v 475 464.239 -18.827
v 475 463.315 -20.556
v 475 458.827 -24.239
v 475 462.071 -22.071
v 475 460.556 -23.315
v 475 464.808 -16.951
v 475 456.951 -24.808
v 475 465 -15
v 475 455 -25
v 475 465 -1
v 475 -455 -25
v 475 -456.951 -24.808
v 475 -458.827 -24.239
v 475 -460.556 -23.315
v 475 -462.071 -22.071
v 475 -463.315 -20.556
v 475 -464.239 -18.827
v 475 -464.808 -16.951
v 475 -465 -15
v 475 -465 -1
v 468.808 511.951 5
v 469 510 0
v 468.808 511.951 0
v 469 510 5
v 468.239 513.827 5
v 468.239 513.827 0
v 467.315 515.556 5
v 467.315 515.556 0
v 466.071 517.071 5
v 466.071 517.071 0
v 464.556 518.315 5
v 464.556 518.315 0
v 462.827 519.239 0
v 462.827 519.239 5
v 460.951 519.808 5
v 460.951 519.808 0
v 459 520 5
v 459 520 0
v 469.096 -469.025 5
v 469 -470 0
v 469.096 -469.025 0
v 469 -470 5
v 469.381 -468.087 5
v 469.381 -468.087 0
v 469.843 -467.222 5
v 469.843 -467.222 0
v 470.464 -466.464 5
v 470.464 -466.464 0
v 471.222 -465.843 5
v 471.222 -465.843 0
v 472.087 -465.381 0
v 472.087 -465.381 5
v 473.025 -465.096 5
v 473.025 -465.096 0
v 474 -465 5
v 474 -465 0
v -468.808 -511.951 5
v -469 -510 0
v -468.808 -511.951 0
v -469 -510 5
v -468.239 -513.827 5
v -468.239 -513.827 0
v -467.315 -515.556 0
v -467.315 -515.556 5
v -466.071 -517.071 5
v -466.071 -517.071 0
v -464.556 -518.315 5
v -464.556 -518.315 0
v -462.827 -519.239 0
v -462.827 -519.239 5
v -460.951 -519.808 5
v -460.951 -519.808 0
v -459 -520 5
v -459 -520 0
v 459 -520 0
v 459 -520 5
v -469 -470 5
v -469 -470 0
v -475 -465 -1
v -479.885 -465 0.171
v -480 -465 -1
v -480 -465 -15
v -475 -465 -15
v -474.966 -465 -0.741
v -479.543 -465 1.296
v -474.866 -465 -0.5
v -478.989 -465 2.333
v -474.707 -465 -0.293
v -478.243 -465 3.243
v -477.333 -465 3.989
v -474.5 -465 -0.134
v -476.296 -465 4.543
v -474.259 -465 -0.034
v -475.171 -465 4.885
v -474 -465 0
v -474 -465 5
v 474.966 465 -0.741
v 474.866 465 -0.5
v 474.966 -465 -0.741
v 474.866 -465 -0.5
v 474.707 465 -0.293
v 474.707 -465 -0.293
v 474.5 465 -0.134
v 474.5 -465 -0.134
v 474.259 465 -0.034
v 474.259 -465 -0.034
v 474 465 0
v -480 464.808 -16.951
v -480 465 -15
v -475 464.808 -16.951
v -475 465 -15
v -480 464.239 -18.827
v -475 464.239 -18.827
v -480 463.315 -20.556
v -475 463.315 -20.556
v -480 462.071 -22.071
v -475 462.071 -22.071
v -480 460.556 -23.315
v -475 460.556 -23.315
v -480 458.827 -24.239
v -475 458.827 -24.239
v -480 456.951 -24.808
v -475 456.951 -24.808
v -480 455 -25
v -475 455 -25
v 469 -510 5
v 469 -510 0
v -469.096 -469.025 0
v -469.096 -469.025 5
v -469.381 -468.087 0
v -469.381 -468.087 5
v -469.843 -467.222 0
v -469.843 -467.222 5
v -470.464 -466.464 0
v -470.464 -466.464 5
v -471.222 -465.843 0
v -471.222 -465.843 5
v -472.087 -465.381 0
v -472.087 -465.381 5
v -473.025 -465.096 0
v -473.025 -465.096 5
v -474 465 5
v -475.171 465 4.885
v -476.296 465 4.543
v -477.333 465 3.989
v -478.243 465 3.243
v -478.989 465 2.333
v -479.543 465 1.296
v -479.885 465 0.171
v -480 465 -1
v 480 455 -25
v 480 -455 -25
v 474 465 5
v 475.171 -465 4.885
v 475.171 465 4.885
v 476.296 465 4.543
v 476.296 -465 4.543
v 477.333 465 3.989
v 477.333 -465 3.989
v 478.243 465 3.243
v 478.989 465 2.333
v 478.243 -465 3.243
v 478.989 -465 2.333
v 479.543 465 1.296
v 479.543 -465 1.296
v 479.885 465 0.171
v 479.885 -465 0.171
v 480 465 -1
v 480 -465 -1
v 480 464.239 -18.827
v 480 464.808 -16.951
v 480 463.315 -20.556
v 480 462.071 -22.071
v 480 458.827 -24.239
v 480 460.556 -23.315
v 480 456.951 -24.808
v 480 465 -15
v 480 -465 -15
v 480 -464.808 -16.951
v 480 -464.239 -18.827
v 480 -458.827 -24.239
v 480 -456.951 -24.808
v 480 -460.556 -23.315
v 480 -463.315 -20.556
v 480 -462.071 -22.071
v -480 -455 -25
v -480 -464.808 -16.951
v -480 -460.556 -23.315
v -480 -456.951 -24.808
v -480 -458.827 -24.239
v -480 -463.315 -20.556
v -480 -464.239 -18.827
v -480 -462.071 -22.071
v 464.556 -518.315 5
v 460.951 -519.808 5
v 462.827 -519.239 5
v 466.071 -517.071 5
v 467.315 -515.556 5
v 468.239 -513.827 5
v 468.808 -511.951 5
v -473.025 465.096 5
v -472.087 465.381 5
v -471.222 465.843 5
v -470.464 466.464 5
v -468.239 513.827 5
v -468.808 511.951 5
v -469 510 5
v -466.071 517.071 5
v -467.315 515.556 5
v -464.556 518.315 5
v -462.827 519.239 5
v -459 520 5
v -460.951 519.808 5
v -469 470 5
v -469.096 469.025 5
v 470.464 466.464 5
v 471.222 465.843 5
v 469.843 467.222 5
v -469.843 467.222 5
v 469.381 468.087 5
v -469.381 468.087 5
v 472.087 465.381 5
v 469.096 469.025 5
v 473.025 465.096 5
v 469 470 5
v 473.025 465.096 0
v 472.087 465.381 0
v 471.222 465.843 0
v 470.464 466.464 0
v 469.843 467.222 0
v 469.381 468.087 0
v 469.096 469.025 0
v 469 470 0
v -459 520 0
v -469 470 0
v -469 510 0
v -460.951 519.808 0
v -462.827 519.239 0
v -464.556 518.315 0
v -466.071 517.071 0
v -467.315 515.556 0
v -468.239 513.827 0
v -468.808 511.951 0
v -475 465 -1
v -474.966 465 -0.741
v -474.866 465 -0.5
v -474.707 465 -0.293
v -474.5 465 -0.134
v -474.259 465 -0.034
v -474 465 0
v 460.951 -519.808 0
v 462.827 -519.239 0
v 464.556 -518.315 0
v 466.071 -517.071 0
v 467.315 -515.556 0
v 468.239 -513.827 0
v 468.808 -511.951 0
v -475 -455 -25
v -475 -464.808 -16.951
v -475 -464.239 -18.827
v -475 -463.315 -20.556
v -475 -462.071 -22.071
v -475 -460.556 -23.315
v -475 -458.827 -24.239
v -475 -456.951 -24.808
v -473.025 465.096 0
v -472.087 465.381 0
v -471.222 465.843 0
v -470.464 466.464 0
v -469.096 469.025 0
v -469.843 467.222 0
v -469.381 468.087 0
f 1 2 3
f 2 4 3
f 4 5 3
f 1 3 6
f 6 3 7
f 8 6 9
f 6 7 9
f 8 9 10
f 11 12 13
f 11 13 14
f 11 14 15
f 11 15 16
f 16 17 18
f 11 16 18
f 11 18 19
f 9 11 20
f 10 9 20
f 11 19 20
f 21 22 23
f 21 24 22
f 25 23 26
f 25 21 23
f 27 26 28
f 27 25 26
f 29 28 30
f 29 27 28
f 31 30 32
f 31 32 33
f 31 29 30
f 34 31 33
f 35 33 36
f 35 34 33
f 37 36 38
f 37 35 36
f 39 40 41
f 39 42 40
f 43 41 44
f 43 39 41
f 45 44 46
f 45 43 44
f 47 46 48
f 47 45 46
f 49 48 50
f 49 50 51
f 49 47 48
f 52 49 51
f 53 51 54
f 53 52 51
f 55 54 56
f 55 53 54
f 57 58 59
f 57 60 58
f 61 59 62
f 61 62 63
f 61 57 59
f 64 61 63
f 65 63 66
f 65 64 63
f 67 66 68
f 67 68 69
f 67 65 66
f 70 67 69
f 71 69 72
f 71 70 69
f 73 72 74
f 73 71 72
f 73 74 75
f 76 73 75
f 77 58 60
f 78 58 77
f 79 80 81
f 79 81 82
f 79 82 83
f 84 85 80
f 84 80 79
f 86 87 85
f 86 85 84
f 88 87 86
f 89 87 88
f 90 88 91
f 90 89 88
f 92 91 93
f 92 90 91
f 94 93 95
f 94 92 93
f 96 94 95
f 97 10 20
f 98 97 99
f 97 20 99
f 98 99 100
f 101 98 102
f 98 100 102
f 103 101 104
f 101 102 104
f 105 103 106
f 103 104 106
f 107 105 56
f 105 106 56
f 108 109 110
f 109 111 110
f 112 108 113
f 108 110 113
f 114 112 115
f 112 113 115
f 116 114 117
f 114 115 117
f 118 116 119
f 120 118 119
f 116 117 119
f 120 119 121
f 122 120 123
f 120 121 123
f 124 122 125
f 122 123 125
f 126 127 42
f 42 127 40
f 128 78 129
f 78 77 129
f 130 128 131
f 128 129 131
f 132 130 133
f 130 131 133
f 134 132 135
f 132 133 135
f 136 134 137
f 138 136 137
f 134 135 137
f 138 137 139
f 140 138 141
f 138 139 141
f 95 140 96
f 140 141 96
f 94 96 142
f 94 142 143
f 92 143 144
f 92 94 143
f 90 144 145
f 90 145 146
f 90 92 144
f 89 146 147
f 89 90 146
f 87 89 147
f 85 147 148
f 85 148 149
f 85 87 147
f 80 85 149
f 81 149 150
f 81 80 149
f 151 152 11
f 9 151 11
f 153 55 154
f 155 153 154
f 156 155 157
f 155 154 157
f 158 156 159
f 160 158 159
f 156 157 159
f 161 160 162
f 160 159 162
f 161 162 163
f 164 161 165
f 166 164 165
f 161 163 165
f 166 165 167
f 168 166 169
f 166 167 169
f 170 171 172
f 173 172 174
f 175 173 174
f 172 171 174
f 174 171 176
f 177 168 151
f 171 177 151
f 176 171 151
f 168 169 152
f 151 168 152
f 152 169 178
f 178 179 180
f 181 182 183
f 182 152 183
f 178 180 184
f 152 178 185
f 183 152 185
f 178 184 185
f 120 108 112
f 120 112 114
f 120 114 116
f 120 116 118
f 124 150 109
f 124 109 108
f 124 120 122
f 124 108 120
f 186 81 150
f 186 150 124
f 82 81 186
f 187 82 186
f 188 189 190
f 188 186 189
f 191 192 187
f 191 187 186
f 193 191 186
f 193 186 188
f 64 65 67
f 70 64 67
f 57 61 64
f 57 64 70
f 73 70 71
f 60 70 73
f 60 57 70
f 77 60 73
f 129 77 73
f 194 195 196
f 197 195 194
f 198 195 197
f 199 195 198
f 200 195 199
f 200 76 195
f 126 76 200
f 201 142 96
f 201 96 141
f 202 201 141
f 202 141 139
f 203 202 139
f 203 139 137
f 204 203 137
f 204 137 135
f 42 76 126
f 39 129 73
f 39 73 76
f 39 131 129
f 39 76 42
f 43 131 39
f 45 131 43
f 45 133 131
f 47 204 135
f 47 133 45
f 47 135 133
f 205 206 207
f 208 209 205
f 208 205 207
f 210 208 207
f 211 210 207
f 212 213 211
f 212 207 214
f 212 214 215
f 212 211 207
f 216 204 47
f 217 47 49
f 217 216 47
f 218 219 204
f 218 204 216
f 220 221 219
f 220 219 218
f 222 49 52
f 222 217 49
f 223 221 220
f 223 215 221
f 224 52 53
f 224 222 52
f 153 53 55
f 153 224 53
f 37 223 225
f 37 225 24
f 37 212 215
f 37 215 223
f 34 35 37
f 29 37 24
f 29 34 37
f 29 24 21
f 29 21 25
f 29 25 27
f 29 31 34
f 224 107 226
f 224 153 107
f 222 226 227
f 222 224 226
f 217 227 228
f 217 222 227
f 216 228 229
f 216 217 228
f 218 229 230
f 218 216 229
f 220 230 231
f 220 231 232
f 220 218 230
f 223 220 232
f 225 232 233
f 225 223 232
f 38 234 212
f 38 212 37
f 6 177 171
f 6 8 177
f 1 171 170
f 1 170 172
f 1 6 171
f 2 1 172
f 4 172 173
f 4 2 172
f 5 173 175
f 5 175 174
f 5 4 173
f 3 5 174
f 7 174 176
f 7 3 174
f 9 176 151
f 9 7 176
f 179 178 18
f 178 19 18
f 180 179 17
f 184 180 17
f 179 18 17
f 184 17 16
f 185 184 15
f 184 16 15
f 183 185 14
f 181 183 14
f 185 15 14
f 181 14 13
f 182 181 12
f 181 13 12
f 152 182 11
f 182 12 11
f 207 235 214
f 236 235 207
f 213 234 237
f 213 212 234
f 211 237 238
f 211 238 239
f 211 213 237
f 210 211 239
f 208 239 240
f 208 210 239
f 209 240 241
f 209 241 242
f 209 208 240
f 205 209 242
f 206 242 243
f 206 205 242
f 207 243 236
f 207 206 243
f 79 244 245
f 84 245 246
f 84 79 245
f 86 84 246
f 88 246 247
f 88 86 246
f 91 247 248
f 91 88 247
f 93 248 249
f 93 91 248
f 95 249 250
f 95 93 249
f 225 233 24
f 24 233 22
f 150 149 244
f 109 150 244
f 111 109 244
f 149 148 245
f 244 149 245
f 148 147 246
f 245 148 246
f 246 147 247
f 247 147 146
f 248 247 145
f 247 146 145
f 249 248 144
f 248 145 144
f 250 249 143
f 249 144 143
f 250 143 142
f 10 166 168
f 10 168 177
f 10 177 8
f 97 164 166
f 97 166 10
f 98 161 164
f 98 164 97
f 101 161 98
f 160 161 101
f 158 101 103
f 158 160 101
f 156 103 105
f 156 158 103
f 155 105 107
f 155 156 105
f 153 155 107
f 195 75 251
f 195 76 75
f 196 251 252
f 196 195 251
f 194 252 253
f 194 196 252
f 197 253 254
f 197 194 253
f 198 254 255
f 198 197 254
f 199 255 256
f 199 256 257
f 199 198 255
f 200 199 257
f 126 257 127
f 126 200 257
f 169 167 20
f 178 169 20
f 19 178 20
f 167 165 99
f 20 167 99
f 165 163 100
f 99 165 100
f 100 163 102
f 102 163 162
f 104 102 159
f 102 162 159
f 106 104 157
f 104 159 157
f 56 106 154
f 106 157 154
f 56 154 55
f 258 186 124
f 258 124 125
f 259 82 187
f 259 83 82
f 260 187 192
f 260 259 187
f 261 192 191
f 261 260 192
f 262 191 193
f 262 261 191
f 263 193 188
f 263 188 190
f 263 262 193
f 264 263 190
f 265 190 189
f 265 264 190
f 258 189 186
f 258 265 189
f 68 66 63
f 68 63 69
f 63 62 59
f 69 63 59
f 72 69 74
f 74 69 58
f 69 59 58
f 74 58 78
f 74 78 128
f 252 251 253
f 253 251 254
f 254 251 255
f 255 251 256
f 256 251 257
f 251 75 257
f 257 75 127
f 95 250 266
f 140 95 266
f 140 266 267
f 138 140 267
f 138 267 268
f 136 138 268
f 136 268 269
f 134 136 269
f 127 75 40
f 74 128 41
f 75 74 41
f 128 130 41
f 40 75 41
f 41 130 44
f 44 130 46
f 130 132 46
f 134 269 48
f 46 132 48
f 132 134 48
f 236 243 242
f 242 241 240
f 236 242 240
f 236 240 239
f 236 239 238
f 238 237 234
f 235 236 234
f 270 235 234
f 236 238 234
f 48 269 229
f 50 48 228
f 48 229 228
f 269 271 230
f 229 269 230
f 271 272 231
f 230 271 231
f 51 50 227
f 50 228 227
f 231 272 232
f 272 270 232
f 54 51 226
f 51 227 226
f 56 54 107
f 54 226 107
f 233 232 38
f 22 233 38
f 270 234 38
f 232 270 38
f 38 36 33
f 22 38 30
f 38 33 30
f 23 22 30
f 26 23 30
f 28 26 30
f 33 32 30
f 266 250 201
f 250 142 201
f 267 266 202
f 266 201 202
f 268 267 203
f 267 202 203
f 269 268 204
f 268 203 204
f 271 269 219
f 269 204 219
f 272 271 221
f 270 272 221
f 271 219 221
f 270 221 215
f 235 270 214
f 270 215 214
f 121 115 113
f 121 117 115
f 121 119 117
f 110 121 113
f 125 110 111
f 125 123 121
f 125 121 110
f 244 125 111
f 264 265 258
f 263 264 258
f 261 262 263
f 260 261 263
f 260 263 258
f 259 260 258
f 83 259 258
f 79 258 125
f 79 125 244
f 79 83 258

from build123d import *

# Parameters (mm, degrees)
F0_W     = 938
F0_H     = 1040
F1_DEPTH = 5
F3_DEPTH = 465
F4_R     = 10
F5_R     = 5


# Not quite as in the source:
# - a pattern or mirror of a feature is missing from the dataset's text; its kind, count and spacing are read off the source's solid


with BuildPart() as f1:
    # F0 (on Top) → F1 (new body)
    with BuildSketch(Plane.XY):
        Rectangle(F0_W, F0_H)
    extrude(amount=F1_DEPTH)

    # F2 (on Front) → F3 (join, symmetric)
    with BuildSketch(Plane.XZ):
        with BuildLine():
            Line((-469, 0), (-469, 5))
            Line((-469, 5), (-474, 5))
            ThreePointArc((-474, 5), (-478.2426406871, 3.2426406871), (-480, -1))
            Line((-480, -1), (-480, -25))
            Line((-480, -25), (-475, -25))
            Line((-475, -25), (-475, -1))
            ThreePointArc((-475, -1), (-474.7071067812, -0.2928932188), (-474, 0))
            Line((-474, 0), (-469, 0))
        make_face()
    f3 = extrude(amount=F3_DEPTH, both=True)

    # F3_copies: F3 across plane
    add(f3.mirror(Plane(origin=(0, 0, 0), x_dir=(0, 0, 1), z_dir=(1, 0, 0))))

    # F4
    f4_edges = [f1.edges().sort_by_distance(p)[0] for p in [
        (-469, -520, 2.5),
        (-477.5, -465, -25),
        (-477.5, 465, -25),
        (-469, 520, 2.5),
        (469, 520, 2.5),
        (469, -520, 2.5),
        (477.5, -465, -25),
        (477.5, 465, -25),
    ]]
    fillet(f4_edges, radius=F4_R)

    # F5
    f5_edges = [f1.edges().sort_by_distance(p)[0] for p in [
        (-469, -465, 2.5),
        (-469, 465, 2.5),
        (469, -465, 2.5),
        (469, 465, 2.5),
    ]]
    fillet(f5_edges, radius=F5_R)


solid = f1.part
